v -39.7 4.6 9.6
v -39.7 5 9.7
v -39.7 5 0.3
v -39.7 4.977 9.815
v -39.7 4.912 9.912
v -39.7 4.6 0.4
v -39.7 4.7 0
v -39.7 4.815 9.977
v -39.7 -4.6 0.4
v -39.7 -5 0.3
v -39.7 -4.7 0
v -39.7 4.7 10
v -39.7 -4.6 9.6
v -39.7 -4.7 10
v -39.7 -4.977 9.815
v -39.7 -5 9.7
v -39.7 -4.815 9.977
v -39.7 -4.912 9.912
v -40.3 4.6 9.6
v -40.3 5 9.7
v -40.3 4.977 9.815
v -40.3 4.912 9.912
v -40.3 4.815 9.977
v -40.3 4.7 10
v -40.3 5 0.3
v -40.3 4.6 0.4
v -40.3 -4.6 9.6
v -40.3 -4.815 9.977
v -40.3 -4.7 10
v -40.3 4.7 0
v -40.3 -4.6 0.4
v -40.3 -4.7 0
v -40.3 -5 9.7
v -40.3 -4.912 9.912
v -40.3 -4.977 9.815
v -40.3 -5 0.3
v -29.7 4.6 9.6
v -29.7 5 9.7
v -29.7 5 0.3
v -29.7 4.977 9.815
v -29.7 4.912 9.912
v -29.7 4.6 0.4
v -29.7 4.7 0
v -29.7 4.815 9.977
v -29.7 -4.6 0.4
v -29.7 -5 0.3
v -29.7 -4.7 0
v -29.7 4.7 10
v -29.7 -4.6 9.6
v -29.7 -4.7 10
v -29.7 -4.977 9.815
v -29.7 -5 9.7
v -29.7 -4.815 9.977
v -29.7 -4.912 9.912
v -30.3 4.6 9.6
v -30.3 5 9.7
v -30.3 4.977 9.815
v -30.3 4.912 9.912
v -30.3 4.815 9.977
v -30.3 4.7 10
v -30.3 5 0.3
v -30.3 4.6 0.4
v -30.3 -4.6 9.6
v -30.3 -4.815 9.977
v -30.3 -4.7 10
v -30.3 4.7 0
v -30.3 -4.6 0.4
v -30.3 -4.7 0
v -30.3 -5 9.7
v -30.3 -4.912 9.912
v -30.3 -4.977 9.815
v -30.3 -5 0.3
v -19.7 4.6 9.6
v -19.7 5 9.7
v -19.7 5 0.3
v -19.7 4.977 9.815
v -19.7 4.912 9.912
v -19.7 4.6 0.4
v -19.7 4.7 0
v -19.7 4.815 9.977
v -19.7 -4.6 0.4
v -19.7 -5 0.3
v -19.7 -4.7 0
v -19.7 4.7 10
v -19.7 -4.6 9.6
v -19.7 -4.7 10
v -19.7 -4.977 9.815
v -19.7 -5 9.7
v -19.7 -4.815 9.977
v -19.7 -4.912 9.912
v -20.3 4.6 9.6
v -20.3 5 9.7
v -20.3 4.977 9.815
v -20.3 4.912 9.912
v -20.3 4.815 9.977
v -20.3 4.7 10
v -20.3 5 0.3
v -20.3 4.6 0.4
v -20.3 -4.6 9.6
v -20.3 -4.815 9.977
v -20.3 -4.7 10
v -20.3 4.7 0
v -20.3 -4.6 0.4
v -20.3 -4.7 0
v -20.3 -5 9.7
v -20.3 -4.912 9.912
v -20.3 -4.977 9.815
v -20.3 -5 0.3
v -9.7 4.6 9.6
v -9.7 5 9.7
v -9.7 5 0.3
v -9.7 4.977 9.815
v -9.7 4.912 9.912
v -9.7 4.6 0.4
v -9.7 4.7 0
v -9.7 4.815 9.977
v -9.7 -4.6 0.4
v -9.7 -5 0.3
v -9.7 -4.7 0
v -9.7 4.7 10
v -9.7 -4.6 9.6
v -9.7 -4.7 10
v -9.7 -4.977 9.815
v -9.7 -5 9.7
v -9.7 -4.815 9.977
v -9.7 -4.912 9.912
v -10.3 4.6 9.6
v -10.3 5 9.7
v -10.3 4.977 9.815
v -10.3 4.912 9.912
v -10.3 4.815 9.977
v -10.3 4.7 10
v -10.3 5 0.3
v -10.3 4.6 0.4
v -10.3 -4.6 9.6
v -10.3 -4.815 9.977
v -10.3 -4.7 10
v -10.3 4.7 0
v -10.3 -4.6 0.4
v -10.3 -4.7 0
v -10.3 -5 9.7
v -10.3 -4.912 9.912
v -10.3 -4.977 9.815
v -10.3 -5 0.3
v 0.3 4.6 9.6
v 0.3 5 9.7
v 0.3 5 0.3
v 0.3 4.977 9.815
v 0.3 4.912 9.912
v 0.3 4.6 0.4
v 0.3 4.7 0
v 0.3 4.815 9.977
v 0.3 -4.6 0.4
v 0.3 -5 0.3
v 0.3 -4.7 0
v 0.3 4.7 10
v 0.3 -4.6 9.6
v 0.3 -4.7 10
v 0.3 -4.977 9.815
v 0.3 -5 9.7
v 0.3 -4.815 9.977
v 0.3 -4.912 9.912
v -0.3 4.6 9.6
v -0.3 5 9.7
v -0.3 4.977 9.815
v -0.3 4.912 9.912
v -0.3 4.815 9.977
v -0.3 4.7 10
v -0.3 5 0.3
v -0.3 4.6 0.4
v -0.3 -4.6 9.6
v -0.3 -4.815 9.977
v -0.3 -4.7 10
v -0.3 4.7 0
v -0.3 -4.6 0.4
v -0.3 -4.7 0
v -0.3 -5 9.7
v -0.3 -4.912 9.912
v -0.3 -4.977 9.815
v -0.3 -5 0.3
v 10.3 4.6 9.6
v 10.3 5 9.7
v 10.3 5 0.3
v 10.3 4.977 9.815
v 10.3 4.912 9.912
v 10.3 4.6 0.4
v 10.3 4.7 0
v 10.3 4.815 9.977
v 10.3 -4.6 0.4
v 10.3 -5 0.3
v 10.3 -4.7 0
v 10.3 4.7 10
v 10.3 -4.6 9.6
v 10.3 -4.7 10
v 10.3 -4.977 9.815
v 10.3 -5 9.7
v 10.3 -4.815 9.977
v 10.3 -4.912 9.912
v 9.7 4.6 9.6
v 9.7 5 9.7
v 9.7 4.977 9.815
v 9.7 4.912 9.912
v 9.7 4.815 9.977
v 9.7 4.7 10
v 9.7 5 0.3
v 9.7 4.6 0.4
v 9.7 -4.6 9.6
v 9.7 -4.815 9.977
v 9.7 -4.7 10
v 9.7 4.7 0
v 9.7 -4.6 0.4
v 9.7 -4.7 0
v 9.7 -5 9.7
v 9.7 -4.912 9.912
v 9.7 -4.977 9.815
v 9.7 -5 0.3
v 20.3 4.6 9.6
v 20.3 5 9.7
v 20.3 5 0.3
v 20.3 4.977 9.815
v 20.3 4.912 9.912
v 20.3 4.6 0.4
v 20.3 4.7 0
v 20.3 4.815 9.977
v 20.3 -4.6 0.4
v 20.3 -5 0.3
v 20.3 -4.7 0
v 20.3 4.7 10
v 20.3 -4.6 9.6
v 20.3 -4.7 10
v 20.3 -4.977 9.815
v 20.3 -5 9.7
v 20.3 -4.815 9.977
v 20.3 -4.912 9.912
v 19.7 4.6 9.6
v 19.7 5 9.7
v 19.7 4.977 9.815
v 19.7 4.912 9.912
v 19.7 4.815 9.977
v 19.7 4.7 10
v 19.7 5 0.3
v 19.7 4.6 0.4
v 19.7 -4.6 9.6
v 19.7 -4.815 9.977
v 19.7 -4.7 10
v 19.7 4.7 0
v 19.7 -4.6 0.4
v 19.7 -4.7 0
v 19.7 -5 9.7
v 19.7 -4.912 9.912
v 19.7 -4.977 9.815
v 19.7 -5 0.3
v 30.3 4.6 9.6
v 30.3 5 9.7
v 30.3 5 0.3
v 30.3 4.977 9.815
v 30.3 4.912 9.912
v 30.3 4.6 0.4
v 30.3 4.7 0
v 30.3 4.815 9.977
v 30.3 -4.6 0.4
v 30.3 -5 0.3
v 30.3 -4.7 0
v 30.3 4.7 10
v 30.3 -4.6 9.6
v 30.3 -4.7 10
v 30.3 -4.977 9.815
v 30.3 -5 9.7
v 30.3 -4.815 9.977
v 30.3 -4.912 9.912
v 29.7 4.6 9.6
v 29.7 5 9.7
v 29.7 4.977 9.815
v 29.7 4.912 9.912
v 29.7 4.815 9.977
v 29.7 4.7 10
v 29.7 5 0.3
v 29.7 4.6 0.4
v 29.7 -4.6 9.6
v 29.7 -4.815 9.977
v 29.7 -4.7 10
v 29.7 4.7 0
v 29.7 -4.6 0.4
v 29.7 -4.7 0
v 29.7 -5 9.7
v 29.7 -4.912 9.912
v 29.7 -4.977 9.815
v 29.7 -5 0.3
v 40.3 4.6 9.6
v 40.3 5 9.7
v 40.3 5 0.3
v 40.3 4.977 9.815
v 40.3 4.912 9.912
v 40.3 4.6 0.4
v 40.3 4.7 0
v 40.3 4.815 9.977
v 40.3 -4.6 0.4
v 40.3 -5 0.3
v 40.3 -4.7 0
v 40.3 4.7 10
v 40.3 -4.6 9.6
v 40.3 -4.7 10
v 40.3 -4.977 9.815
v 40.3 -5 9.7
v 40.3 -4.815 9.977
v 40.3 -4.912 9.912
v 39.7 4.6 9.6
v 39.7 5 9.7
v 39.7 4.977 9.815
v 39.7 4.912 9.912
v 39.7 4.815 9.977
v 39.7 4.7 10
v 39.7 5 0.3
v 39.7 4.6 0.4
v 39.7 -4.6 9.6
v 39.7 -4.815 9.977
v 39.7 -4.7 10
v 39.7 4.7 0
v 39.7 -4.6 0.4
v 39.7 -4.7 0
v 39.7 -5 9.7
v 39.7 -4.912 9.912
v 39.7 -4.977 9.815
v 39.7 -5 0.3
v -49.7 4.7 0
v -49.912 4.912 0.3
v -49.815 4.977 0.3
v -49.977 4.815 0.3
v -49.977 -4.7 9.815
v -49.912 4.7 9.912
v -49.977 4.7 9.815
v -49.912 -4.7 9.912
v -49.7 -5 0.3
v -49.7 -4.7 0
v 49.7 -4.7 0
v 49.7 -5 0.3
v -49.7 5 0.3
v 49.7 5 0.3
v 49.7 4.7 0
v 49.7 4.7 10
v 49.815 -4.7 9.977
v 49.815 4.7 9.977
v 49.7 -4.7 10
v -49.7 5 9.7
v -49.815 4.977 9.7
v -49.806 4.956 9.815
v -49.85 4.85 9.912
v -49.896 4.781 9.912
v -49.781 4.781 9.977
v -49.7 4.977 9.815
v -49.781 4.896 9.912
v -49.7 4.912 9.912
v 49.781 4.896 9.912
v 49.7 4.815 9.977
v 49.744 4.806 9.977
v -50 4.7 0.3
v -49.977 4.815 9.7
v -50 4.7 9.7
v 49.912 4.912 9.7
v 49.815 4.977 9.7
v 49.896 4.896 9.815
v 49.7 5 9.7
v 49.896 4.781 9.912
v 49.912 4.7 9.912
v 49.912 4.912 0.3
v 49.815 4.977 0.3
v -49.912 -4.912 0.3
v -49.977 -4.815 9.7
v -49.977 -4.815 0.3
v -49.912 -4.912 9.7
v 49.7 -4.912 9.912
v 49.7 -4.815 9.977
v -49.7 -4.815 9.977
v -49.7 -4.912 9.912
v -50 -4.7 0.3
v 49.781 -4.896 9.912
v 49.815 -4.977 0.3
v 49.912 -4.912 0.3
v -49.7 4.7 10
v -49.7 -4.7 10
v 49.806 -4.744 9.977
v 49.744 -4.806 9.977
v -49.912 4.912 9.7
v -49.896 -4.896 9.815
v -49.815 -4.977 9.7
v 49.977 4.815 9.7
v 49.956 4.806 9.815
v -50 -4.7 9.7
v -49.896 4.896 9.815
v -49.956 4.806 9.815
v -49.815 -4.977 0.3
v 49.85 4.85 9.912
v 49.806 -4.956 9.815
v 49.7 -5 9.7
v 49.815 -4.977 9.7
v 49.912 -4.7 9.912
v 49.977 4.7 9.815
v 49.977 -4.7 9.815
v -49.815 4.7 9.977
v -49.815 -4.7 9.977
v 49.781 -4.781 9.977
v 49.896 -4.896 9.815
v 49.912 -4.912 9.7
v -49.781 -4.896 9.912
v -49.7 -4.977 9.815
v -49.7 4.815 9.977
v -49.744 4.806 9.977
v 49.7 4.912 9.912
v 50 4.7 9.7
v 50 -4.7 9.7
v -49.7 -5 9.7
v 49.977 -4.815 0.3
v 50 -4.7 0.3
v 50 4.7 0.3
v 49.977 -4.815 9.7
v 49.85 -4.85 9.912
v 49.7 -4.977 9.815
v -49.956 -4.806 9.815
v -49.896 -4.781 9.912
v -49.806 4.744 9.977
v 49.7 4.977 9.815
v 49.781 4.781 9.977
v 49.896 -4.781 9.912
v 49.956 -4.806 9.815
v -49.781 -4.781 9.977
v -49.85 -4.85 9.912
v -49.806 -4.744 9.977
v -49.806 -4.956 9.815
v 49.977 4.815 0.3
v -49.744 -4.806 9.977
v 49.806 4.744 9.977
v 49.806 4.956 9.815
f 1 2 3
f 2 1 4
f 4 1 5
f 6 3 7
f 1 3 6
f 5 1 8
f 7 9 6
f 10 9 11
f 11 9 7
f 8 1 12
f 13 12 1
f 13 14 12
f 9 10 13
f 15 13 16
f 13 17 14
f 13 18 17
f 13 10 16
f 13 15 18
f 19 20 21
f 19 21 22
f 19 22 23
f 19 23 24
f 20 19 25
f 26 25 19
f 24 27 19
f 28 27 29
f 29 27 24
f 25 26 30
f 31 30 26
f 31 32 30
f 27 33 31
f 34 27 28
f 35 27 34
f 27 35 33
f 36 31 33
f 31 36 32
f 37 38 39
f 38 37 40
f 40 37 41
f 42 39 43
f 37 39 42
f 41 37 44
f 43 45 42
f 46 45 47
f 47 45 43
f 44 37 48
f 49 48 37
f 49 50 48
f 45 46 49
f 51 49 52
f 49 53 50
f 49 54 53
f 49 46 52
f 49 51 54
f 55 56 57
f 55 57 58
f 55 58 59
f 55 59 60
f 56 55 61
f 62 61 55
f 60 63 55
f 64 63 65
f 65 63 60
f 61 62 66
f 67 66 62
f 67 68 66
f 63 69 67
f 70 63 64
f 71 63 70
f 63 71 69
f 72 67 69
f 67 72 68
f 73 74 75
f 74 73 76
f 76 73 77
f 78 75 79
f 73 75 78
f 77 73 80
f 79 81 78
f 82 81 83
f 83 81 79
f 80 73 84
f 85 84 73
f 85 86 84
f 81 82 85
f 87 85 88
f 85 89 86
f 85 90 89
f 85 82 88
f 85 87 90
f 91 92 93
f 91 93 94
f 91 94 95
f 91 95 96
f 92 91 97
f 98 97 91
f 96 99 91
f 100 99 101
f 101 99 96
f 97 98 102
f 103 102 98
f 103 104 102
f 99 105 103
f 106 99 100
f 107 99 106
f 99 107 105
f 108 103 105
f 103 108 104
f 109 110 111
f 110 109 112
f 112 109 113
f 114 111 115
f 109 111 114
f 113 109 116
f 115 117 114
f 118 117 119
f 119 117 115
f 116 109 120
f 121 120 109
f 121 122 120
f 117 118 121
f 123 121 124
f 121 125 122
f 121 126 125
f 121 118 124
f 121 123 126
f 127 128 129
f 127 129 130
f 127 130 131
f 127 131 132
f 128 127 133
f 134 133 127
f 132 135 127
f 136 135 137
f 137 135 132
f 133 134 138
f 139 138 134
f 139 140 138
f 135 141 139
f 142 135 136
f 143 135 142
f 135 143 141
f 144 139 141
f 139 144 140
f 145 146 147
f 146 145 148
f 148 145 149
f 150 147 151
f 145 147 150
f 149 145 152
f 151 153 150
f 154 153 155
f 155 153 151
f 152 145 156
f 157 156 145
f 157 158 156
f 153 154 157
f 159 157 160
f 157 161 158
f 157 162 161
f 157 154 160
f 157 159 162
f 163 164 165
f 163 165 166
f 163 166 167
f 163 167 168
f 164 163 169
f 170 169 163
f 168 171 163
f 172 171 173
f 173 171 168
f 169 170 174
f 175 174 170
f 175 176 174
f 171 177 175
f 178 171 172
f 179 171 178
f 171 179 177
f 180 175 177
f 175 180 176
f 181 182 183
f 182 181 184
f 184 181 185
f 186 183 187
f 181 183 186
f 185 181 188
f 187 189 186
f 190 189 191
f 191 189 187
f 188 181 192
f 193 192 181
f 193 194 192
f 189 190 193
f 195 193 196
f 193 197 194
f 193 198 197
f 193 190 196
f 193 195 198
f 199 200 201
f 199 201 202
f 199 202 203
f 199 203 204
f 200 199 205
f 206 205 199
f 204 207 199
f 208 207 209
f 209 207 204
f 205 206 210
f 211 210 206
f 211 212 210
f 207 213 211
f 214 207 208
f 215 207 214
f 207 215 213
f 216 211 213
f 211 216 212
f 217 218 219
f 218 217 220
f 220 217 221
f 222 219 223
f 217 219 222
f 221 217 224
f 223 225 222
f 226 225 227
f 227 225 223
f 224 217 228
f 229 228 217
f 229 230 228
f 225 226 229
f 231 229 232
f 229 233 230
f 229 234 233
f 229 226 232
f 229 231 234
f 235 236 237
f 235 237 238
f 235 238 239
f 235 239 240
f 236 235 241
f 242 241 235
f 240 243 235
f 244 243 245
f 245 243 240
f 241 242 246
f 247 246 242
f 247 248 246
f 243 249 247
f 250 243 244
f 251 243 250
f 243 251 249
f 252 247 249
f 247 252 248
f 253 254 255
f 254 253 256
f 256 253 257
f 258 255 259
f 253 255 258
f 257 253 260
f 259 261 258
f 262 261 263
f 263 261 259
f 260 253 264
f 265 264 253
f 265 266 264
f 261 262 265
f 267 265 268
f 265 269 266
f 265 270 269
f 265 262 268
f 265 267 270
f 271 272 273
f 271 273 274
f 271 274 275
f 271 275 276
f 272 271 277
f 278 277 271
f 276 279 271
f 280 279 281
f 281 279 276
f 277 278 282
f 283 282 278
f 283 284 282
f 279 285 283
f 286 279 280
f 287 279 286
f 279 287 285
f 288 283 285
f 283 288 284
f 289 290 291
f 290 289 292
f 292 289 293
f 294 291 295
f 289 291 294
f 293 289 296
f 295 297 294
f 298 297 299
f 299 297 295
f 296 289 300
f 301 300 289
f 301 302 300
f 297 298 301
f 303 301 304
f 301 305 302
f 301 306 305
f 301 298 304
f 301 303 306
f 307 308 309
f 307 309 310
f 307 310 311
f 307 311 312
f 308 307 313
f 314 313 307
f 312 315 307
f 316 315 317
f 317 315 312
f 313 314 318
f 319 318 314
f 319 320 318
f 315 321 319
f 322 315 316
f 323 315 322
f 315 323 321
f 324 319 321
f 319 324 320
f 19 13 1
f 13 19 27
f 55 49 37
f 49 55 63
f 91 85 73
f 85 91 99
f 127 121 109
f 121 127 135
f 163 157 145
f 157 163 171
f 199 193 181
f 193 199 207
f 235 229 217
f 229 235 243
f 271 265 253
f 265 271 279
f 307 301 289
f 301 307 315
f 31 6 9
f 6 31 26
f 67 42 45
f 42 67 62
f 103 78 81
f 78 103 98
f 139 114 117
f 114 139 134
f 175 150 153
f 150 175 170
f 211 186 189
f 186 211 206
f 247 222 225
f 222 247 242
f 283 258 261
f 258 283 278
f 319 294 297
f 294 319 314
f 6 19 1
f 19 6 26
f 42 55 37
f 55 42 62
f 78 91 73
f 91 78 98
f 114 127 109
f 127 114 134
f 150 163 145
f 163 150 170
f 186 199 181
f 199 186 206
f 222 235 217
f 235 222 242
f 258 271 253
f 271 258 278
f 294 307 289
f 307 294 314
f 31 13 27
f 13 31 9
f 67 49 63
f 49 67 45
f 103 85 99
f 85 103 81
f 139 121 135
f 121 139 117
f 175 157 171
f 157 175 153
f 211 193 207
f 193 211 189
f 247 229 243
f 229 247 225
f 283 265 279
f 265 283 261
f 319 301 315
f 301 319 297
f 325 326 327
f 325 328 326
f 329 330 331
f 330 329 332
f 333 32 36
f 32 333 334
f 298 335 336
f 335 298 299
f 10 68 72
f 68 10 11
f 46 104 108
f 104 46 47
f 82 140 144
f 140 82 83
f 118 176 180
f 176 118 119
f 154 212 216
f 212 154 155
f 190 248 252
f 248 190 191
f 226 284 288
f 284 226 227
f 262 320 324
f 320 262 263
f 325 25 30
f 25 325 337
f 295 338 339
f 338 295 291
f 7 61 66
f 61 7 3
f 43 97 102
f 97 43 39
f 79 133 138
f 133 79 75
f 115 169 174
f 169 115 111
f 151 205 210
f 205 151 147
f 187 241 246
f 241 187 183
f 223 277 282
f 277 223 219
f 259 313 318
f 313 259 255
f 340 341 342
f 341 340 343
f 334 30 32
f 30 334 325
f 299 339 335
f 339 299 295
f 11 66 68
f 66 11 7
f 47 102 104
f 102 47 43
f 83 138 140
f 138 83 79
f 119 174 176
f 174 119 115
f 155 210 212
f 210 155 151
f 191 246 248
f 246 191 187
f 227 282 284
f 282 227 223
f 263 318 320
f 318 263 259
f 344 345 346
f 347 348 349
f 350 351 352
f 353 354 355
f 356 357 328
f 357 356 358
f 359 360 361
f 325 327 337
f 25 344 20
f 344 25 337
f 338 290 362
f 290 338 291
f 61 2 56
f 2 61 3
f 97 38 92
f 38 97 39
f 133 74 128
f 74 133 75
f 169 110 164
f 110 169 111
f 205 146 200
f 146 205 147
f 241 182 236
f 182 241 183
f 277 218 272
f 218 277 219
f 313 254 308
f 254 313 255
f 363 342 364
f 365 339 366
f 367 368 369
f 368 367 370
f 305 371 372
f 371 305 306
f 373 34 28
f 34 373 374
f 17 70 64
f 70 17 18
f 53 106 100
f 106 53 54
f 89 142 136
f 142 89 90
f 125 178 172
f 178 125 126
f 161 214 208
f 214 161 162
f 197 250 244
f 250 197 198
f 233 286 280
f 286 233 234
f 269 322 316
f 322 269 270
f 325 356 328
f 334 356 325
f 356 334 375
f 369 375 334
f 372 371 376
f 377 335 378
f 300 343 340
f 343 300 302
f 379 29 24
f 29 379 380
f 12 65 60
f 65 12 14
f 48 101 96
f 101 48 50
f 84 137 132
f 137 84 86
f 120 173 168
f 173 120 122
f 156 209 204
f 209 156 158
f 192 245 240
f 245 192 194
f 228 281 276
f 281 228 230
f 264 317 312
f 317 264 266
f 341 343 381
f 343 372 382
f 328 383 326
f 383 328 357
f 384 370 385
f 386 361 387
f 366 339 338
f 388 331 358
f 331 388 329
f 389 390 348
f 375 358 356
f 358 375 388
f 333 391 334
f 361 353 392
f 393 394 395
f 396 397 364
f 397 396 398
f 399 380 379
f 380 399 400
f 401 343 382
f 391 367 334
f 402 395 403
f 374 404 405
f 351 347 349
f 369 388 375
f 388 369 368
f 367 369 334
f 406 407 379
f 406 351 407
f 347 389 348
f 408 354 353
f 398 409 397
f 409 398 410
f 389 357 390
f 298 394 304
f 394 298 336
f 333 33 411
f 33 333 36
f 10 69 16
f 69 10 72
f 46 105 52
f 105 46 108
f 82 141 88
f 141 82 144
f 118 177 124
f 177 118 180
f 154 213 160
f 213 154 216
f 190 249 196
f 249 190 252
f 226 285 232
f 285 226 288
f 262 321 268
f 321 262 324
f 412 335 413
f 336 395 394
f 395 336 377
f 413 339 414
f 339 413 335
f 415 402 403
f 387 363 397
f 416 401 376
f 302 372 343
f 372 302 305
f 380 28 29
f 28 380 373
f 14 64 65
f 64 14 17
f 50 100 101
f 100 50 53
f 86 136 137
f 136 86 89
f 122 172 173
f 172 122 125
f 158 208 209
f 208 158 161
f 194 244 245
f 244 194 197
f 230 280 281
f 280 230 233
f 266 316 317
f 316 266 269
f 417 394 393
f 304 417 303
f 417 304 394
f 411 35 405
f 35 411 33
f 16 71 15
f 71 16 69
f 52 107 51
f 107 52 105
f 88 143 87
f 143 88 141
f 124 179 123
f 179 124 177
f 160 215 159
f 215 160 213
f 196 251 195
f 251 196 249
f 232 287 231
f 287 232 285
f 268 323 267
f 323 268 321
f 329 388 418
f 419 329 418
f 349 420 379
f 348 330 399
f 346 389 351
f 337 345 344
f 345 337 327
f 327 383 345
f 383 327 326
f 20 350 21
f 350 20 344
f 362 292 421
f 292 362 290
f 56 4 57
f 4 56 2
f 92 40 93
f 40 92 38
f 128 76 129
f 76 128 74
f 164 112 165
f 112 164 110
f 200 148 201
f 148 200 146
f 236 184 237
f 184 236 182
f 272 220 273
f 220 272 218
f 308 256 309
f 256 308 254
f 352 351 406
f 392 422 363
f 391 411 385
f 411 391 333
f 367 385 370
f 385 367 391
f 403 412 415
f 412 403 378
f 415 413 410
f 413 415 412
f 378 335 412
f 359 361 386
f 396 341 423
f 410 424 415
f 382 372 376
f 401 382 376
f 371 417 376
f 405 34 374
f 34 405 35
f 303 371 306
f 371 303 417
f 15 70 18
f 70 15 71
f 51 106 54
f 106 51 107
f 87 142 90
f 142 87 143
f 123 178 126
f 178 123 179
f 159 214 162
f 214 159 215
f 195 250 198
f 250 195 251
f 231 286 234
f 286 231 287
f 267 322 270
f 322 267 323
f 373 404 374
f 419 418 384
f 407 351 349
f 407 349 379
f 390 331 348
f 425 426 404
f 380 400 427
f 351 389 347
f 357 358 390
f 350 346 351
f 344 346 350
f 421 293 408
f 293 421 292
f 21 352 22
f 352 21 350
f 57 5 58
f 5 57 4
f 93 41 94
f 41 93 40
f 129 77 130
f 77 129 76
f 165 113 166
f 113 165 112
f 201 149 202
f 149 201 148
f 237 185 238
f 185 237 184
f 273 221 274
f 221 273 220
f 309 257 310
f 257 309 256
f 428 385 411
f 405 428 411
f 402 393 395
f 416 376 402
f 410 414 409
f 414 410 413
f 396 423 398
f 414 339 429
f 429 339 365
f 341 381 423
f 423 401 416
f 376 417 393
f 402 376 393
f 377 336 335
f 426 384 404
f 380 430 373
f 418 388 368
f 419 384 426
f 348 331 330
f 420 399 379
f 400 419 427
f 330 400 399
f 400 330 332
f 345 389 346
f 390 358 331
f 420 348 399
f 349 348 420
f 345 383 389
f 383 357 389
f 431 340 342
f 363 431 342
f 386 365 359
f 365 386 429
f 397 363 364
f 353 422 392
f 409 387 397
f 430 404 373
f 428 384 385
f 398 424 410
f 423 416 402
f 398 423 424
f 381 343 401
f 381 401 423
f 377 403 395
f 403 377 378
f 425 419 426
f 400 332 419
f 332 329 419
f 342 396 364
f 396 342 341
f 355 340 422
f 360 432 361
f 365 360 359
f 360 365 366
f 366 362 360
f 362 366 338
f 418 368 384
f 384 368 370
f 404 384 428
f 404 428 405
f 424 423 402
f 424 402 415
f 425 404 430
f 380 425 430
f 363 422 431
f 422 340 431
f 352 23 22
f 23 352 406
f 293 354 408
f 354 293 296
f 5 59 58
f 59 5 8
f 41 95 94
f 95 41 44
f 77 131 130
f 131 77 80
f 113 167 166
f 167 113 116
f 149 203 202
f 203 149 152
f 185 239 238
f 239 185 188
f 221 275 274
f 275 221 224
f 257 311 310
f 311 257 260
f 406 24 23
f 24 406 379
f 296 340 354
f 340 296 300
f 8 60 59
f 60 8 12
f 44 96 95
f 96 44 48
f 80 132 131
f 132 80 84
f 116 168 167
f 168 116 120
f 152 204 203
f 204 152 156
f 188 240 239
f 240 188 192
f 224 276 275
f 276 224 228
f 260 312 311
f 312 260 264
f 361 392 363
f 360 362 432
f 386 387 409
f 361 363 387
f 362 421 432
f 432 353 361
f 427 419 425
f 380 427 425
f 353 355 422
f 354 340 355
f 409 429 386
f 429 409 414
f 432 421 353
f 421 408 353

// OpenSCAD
// M+ 3D – én base 10-kloss: ener, tier, hundrer eller tusener.
//
// Alle verdier settes fra PHP med -D (bare tall). Standardverdiene under gjør
// at fila også kan åpnes direkte i OpenSCAD (her: en tier).
//
// Koordinater (mm):
//   Klossen er nx × ny × nz enheter. Den står midt over origo i XY, med
//   undersiden på z = 0. Slik ligger den også på byggeplaten:
//     ener      1 × 1 × 1
//     tier     10 × 1 × 1    ligger ned (langs X)
//     hundrer  10 × 10 × 1   ligger flatt
//     tusener  10 × 10 × 10  hul: åpen side OPP (se under)
//
// Kantavrunding:
//   Kantene på oversiden og de loddrette kantene avrundes med radius r. Kantene
//   mot byggeplaten får i stedet en 45° fas av samme størrelse. Da blir det
//   ikke overheng, og fasen motvirker «elefantfot» i første lag. De ytre målene
//   er uendret. Klossen lages som hull() av fire sylindre, fire kupler og et
//   rektangel i bunnen – mye raskere enn minkowski().
//
// Rutenett:
//   Ved hver enhetsgrense (k · enhet) skjæres det en rille med bredde w og
//   dybde d inn fra ALLE ytterflatene som krysser grensa: en skive med
//   tykkelse w minus en kjerne som er d mindre på alle sider. Rillene går
//   dermed rundt staven, danner et 10 × 10-rutenett på hundreren og på alle
//   sider av tusenerkuben, og kan aldri gå gjennom modellen.
//
// Hul tusener:
//   Fem lukkede sider og åpen side. Fila står med den åpne siden opp, som en
//   kopp: da trengs verken støtte eller brobygging (med åpen side ned måtte
//   skriveren ha bygd et tak på nesten 10 cm uten noe under). Snu kuben etter
//   utskrift. Toppkanten (åpningen) får ikke riller.

unit          = 10;
nx            = 10;
ny            = 1;
nz            = 1;
edge_radius   = 0.3;

grid_on       = 1;      // 1 = riller ved hver enhetsgrense
groove_depth  = 0.4;
groove_width  = 0.6;

hollow        = 0;      // 1 = hul med åpen overside (bare tusener)
wall          = 2;

edge_segments = 16;     // segmenter per hel sirkel i avrundingen

Lx = nx * unit;
Ly = ny * unit;
Lz = nz * unit;
r  = edge_radius;
fn = max(8, 4 * ceil(edge_segments / 4));   // delelig med 4: punkt rett ut i ±X og ±Y
d  = groove_depth;
w  = groove_width;

// Halvkule med punkt både på ekvator og i toppen, så høyden blir eksakt.
module dome(rad) {
    k = fn / 4;
    rotate_extrude($fn = fn)
        polygon(concat([[0, 0]], [for (i = [0 : k]) let(a = 90 * i / k) rad * [cos(a), sin(a)]]));
}

module body() {
    if (r <= 0) {
        translate([-Lx / 2, -Ly / 2, 0]) cube([Lx, Ly, Lz]);
    } else {
        hull() {
            // bunnen: fas på 45°
            translate([-Lx / 2 + r, -Ly / 2 + r, 0]) cube([Lx - 2 * r, Ly - 2 * r, 0.01]);
            for (sx = [-1, 1], sy = [-1, 1]) {
                translate([sx * (Lx / 2 - r), sy * (Ly / 2 - r), r])
                    cylinder(r = r, h = Lz - 2 * r, $fn = fn);
                translate([sx * (Lx / 2 - r), sy * (Ly / 2 - r), Lz - r])
                    dome(r);
            }
        }
    }
}

module grooves() {
    difference() {
        union() {
            if (nx > 1) for (k = [1 : nx - 1])
                translate([-Lx / 2 + k * unit - w / 2, -Ly / 2 - 1, -1]) cube([w, Ly + 2, Lz + 2]);
            if (ny > 1) for (k = [1 : ny - 1])
                translate([-Lx / 2 - 1, -Ly / 2 + k * unit - w / 2, -1]) cube([Lx + 2, w, Lz + 2]);
            if (nz > 1) for (k = [1 : nz - 1])
                translate([-Lx / 2 - 1, -Ly / 2 - 1, k * unit - w / 2]) cube([Lx + 2, Ly + 2, w]);
        }
        // Kjernen rillene ikke får gå inn i. For hul kube går den gjennom
        // toppen, så åpningen ikke får hakk.
        translate([-Lx / 2 + d, -Ly / 2 + d, d])
            cube([Lx - 2 * d, Ly - 2 * d, hollow == 1 ? Lz : Lz - 2 * d]);
    }
}

module cavity() {
    translate([-Lx / 2 + wall, -Ly / 2 + wall, wall])
        cube([Lx - 2 * wall, Ly - 2 * wall, Lz]);
}

difference() {
    body();
    if (grid_on == 1 && (nx > 1 || ny > 1 || nz > 1)) grooves();
    if (hollow == 1) cavity();
}
